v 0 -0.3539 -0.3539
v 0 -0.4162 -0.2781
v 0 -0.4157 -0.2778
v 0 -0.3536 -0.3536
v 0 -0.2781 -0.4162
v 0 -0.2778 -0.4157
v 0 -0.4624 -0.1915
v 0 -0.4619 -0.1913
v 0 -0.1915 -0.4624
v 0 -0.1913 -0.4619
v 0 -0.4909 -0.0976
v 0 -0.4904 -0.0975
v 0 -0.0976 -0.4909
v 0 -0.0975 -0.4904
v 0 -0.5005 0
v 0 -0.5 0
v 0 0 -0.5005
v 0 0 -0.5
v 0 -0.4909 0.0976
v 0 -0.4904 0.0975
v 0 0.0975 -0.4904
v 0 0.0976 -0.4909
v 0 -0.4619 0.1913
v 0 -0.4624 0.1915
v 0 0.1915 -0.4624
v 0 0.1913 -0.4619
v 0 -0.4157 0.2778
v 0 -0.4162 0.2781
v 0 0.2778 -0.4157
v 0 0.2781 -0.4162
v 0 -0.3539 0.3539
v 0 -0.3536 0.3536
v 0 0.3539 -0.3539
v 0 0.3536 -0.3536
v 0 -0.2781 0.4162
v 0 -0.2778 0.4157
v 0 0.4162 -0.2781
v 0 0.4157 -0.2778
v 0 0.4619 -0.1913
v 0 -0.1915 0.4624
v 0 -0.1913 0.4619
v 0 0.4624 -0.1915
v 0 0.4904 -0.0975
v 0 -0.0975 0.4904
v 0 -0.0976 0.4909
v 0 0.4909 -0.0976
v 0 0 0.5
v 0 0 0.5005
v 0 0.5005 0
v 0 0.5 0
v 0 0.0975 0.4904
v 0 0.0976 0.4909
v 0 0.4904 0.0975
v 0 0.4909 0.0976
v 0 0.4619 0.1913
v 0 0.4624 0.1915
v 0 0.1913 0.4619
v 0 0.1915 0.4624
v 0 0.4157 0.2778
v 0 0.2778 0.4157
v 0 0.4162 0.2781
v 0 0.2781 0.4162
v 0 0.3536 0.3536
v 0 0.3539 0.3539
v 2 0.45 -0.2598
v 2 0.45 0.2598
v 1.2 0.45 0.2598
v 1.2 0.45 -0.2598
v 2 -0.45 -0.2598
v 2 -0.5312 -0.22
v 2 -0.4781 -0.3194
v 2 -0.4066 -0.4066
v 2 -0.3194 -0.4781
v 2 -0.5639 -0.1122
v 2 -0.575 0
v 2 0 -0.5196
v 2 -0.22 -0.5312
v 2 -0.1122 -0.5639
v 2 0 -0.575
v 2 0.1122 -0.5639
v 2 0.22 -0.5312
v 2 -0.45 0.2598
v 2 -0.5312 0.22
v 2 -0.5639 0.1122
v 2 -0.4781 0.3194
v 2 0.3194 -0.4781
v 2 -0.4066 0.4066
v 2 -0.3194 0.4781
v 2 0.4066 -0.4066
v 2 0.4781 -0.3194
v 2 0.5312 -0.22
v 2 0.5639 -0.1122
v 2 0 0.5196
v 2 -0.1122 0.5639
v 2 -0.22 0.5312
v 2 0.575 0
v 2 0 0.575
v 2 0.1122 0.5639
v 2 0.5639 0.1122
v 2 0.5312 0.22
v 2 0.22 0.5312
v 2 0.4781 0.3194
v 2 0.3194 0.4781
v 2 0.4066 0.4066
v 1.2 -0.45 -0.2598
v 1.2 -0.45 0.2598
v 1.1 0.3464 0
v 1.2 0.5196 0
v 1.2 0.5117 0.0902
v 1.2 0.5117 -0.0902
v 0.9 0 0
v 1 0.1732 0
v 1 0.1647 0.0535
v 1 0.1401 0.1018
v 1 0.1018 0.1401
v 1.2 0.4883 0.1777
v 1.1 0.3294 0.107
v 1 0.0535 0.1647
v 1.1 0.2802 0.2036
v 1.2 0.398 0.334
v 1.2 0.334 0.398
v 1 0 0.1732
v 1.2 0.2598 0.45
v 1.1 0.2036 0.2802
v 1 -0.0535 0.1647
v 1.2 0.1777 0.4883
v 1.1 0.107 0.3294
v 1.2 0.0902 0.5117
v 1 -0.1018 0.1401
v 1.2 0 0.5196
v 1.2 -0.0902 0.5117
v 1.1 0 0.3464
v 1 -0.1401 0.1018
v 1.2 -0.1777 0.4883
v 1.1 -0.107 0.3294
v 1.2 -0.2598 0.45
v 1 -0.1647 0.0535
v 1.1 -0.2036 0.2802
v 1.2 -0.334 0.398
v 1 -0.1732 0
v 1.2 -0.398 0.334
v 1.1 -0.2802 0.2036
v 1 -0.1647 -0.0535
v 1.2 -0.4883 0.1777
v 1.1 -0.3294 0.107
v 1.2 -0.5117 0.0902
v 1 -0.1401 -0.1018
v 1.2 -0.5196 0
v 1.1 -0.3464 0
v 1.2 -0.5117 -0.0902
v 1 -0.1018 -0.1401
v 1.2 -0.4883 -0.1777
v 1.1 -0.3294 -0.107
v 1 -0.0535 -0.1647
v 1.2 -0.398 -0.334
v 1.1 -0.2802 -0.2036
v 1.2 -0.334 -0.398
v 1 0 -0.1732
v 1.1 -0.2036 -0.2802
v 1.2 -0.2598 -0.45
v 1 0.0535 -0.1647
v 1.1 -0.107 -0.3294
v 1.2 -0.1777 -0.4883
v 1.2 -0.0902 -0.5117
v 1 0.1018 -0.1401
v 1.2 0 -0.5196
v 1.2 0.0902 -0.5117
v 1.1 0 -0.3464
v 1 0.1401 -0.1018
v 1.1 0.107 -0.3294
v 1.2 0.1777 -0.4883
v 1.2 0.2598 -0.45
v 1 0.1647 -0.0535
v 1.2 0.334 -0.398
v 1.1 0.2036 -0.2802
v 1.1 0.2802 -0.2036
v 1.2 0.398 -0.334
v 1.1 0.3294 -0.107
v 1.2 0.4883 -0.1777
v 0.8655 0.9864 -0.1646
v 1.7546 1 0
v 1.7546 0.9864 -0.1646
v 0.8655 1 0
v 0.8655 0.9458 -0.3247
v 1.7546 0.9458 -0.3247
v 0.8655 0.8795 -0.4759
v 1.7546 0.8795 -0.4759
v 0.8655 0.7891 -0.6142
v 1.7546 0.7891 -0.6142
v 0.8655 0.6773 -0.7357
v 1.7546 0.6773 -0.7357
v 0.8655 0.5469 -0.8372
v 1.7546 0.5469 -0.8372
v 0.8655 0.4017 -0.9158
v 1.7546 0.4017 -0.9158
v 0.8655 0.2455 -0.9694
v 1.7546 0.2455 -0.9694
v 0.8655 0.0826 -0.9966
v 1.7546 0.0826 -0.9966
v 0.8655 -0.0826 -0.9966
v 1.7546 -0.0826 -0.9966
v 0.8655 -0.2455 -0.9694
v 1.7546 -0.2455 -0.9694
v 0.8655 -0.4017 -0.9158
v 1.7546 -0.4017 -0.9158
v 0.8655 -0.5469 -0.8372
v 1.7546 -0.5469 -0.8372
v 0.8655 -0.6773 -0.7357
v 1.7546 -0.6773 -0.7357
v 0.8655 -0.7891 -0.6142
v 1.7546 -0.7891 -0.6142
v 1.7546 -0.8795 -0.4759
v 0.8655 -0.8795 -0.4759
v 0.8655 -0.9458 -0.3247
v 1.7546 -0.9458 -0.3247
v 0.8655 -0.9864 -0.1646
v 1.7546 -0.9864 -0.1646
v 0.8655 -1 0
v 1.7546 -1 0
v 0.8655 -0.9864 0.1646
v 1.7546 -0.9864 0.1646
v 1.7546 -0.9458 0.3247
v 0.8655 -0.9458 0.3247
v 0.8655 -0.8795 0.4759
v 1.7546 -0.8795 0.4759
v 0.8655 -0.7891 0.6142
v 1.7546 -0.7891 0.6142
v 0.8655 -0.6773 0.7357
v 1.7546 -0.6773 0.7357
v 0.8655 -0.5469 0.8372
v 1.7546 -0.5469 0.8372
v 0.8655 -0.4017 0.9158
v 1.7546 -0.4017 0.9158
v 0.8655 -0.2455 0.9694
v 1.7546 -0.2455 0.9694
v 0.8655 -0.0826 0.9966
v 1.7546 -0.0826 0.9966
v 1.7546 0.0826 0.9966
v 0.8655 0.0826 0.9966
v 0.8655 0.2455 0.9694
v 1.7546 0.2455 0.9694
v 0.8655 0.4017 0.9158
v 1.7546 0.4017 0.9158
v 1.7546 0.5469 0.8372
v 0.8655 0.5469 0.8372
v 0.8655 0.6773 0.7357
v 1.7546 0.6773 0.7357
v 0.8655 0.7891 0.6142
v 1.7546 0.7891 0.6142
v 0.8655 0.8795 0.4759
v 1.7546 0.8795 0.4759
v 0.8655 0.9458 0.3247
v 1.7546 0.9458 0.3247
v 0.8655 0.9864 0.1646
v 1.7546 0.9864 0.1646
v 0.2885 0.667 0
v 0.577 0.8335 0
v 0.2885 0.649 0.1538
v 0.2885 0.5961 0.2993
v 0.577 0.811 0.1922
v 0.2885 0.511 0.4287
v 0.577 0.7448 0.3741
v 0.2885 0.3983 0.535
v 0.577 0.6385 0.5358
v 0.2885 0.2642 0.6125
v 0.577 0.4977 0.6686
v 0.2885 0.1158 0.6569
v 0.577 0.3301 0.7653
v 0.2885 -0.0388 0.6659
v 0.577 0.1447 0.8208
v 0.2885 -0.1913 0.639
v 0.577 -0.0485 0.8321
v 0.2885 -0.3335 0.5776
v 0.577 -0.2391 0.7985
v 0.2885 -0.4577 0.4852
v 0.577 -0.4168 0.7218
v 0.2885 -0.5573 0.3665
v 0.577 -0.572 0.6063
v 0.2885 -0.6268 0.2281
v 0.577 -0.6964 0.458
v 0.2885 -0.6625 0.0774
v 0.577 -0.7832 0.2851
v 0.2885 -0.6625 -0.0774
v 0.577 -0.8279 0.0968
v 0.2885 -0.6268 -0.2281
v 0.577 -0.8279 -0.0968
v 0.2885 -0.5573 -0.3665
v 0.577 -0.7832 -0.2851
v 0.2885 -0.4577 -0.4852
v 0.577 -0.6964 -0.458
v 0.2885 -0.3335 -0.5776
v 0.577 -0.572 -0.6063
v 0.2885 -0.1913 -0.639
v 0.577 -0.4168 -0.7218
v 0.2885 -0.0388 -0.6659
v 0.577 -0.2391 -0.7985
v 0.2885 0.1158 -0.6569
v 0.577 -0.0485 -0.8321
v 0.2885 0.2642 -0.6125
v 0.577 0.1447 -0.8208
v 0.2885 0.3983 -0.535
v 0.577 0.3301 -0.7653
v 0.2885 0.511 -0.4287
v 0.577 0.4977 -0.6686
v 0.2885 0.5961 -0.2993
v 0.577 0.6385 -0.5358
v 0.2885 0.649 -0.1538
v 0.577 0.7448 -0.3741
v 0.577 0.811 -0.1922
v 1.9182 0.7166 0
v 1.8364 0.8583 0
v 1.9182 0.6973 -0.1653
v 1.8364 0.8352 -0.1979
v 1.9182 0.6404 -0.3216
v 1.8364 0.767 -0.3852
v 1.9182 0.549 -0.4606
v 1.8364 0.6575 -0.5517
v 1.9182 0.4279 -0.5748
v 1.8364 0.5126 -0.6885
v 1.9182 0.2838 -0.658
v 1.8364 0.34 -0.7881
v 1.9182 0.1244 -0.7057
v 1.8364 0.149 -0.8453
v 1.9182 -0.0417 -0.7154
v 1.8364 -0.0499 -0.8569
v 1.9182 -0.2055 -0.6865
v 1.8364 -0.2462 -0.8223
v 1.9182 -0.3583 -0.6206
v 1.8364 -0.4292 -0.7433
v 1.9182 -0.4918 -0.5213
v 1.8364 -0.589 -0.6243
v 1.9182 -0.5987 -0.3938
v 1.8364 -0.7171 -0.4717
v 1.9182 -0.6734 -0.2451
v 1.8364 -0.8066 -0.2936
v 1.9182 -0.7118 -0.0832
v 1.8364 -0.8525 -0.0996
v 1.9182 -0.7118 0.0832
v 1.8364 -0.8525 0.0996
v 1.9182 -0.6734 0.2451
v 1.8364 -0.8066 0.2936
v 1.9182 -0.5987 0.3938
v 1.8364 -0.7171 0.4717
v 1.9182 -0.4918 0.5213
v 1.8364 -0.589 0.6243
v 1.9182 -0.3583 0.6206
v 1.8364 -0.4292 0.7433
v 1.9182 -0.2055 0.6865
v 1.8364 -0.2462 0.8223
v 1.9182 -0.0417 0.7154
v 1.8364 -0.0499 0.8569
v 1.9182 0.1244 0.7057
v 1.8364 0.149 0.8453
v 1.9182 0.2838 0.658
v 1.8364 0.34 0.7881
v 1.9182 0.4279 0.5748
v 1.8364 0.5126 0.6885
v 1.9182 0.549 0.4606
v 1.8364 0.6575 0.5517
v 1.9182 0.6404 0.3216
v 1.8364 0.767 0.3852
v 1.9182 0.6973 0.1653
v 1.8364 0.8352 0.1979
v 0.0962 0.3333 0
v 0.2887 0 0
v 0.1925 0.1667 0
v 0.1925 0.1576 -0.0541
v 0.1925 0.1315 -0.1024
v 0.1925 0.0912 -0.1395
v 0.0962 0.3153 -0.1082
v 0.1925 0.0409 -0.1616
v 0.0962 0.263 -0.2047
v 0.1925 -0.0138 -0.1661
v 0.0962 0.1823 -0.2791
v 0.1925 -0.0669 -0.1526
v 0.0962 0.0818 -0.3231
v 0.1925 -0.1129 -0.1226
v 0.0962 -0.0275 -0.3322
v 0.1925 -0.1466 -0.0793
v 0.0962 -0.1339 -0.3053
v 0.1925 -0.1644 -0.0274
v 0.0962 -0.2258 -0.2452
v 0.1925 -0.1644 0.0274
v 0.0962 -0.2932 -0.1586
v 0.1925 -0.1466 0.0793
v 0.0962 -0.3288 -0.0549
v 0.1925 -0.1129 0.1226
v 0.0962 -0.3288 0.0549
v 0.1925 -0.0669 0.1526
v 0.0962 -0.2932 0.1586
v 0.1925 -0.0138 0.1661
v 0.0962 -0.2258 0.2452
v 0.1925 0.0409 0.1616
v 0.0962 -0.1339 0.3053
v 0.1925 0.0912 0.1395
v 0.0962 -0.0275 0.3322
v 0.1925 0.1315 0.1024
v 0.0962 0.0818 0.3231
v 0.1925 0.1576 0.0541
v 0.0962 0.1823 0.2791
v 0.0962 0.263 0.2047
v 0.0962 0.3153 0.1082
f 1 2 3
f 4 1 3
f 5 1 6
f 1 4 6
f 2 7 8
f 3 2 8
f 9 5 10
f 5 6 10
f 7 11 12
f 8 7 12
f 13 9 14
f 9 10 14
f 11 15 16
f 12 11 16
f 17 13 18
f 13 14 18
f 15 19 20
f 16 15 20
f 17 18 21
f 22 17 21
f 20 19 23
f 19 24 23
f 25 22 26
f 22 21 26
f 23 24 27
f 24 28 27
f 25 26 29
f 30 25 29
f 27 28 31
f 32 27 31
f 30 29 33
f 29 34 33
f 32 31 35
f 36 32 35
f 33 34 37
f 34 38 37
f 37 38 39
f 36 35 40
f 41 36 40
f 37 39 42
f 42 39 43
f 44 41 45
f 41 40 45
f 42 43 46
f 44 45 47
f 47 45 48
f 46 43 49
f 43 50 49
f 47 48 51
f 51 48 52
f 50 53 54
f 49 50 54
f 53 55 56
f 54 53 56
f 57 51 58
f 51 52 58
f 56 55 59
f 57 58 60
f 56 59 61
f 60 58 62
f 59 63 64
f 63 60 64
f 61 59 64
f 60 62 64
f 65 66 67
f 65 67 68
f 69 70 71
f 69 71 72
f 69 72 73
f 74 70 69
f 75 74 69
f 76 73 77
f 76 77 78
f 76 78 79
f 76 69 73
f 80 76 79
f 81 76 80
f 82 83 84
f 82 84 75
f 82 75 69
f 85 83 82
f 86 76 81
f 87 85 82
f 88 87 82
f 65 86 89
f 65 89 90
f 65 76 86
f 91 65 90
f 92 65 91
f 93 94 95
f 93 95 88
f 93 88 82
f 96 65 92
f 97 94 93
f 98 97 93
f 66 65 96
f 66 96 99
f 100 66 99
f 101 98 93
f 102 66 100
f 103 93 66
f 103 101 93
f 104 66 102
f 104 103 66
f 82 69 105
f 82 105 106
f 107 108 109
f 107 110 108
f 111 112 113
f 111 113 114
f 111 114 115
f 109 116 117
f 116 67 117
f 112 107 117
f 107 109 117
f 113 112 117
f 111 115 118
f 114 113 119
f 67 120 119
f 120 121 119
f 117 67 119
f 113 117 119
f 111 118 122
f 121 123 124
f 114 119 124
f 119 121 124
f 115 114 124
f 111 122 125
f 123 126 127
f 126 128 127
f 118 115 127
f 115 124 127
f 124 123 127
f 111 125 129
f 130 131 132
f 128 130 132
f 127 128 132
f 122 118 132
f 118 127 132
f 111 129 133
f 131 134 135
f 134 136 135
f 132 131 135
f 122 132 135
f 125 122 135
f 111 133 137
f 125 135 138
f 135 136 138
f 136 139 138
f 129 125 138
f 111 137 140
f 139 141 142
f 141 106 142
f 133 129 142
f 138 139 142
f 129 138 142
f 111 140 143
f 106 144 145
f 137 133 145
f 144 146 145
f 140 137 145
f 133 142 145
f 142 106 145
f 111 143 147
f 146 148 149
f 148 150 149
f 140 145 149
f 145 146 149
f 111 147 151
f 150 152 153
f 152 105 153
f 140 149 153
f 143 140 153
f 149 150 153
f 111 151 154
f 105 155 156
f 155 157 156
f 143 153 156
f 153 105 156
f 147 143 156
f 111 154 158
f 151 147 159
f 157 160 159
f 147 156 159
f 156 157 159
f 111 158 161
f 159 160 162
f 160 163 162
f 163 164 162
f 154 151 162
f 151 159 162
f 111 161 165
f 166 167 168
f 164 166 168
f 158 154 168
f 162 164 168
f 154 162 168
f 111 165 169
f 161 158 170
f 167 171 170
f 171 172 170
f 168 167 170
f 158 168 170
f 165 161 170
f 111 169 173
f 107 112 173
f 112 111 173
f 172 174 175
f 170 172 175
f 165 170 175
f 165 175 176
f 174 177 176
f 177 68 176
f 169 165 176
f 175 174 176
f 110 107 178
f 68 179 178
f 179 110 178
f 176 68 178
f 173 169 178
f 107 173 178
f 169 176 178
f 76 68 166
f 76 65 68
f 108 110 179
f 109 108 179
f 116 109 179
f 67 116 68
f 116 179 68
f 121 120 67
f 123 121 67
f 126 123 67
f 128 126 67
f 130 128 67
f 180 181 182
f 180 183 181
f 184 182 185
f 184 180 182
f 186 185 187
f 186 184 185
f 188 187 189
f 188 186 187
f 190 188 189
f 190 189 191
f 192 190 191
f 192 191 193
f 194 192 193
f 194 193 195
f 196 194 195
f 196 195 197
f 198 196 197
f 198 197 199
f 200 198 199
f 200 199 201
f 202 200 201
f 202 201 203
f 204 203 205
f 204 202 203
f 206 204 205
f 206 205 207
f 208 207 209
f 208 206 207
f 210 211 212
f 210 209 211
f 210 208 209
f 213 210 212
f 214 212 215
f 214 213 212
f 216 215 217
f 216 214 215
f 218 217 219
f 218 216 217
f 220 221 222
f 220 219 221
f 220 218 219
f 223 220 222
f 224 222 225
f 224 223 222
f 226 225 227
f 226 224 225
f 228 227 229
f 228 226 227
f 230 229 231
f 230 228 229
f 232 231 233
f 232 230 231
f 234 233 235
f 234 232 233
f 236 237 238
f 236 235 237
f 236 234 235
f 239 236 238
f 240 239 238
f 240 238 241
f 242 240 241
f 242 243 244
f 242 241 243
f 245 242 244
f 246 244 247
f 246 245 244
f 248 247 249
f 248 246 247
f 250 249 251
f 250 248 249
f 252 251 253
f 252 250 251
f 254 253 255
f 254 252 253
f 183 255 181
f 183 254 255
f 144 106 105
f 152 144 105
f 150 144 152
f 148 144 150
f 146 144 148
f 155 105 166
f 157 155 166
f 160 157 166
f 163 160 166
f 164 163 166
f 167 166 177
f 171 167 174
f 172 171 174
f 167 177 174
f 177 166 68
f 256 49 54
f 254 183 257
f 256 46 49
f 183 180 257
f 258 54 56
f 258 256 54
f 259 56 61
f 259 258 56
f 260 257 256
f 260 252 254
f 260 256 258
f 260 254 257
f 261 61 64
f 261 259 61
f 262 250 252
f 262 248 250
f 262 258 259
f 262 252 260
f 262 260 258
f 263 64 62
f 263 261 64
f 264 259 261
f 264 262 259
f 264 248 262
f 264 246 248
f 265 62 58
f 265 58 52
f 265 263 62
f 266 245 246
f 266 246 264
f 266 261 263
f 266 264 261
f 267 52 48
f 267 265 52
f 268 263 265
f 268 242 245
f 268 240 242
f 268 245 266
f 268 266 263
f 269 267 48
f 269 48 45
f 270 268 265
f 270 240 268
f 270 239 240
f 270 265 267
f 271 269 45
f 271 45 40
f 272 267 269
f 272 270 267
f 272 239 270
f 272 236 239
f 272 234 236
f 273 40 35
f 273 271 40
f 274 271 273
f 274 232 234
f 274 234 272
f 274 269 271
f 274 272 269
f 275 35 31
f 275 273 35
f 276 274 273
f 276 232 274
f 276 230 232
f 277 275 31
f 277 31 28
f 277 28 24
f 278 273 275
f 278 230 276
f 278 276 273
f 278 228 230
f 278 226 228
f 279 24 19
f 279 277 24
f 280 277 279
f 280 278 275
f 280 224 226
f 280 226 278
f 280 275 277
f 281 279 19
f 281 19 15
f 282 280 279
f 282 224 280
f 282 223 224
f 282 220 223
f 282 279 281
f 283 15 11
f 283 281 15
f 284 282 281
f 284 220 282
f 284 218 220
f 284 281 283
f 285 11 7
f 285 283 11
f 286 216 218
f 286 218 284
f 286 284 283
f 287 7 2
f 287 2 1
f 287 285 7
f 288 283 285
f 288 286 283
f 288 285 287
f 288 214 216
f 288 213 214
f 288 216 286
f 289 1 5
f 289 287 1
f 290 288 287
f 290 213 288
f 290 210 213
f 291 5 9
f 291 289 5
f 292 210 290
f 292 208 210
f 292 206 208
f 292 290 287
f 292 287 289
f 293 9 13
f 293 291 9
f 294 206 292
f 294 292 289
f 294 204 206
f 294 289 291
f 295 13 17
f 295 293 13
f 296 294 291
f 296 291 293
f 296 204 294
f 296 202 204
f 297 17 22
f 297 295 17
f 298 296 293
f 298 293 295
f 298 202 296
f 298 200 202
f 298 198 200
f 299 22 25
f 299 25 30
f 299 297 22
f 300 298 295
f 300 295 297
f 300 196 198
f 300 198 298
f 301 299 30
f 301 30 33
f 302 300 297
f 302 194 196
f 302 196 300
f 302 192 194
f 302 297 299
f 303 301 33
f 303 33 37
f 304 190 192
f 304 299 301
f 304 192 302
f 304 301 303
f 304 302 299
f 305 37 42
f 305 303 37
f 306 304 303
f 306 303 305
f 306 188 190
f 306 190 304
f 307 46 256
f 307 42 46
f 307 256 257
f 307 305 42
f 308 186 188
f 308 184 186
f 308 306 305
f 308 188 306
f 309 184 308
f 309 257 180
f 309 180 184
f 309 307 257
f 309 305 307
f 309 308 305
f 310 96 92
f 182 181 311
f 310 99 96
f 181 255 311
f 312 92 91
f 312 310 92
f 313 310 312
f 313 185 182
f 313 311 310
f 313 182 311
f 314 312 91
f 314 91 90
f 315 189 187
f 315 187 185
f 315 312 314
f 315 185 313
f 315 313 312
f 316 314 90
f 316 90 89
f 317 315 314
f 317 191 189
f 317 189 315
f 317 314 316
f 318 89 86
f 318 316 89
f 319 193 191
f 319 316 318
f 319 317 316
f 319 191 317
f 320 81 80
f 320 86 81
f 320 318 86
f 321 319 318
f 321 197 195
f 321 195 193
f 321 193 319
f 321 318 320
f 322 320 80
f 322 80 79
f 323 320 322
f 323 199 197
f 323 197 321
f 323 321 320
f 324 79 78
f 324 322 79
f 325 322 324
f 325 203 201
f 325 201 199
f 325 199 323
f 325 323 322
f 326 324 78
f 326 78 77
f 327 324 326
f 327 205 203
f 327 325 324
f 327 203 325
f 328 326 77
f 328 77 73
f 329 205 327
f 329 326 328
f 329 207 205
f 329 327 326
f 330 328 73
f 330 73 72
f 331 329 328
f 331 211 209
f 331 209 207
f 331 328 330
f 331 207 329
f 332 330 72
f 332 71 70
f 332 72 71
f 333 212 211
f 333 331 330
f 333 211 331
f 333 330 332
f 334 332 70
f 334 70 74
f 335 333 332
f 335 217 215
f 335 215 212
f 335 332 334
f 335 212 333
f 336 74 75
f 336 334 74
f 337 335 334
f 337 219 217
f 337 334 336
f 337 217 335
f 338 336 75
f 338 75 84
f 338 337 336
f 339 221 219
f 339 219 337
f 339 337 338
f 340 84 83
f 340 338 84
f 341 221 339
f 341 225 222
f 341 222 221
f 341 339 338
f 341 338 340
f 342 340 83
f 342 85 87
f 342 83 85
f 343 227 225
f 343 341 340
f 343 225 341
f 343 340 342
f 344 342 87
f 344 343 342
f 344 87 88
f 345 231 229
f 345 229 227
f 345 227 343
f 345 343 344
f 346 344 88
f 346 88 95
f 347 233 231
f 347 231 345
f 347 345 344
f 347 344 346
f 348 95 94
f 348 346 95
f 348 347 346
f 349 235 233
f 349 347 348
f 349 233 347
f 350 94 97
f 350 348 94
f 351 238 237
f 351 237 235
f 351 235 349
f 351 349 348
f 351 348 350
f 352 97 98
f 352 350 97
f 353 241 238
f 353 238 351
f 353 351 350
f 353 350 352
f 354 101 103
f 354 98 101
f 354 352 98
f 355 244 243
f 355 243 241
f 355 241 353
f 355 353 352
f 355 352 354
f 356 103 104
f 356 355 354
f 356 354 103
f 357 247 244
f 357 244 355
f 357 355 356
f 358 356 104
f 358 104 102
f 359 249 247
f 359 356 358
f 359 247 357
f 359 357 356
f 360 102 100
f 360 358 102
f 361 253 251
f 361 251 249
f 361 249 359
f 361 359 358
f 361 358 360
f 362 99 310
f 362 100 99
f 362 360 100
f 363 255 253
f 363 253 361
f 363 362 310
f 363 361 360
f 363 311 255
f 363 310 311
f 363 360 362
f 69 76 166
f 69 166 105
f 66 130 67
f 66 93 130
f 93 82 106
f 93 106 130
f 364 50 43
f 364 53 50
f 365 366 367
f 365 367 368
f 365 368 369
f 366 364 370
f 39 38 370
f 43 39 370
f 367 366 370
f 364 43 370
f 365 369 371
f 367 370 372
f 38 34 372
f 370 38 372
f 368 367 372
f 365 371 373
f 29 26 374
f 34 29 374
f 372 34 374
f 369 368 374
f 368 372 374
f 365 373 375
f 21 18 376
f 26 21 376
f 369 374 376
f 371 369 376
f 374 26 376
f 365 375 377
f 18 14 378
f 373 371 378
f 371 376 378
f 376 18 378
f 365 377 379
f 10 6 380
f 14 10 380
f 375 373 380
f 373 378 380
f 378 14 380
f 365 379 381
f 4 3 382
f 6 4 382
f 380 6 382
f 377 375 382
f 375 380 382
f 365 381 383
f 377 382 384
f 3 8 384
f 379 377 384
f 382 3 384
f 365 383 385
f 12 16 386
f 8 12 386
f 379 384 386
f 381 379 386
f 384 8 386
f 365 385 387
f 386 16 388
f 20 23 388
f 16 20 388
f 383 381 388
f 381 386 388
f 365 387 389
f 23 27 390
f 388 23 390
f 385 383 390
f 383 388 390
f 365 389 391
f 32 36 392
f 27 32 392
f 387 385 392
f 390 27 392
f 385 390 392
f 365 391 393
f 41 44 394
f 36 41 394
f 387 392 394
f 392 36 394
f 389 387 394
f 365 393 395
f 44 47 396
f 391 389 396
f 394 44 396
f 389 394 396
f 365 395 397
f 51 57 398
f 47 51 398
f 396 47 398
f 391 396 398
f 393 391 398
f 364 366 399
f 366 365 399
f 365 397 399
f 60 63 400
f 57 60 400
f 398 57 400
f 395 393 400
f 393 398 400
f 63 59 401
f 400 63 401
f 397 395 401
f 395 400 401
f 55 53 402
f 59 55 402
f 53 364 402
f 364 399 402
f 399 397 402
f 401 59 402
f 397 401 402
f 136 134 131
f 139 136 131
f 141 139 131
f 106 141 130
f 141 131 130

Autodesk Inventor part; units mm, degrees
ref_plane "YZ Plane" through (0, 0, 0) normal (1, 0, 0) x (0, 1, 0)
ref_plane "XZ Plane" through (0, 0, 0) normal (0, 1, 0) x (-1, 0, 0)
sketch "Sketch1" plane through (0, 0, 0) normal (0, 0, 1) x (1, 0, 0)
  line L0 (0.2887, 0) -> (0.9, 0)
  line L1 (2, 0.5196) -> (2, 1)
  line L2 (2, 1) -> (0, 1)
  line L3 (2, 0.5196) -> (1.2, 0.5196)
  line L4 (1.2, 0.5196) -> (0.9, 0)
  line L5 (0, 0.5) -> (0.2887, 0)
  line L6 (0, -0.2) -> (0, 1.2) projected
  line L7 (0, 0.5) -> (0, 1)
  point P0 (0, 0)
  dimension "d0" = 0.8
  dimension "d1" = 60
  dimension "d2" = 2
  dimension "d3" = 1.0392
  dimension "d4" = 2
  dimension "d5" = 60
  dimension "d7" = 1
revolve "Body" add sketch "Sketch1" angle 360 about axis through (0.2887, 0, 0) along (1, 0, 0)
sketch "Sketch2" plane through (2, 0, 0) normal (1, 0, 0) x (0, 0, -1)
  circle A0 centre (0, 0) radius 0.5196 projected
  circle A1 centre (0, 0) radius 1 projected
  line L0 (0.5196, 0) -> (0.2598, -0.45)
  line L1 (0.2598, -0.45) -> (-0.2598, -0.45)
  line L2 (-0.2598, -0.45) -> (-0.5196, 0)
  line L3 (-0.5196, 0) -> (-0.2598, 0.45)
  line L4 (-0.2598, 0.45) -> (0.2598, 0.45)
  line L5 (0.2598, 0.45) -> (0.5196, 0)
extrude "Slot" add sketch "Sketch2" against normal blind 0.8 contours L5 A0 | A0 L0 | L4 A0 | A0 L1 | L3 A0 | A0 L2
chamfer "Chamfer1" distance 0.5 angle 60 1 edges at (0, -1, 0) measured on face at (0, 0.8236, -0.0798)
thread "Thread" size "M2x0.4" class "6g" standard "ISO Metric profile" length 2
chamfer "Chamfer2" distance 0.2454 angle 60 1 edges at (2, -1, 0) measured on face at (1.244, 0.9871, -0.1604)
ref_plane "Work Plane1" through (1, 0, 0) normal (0, -0.5, -0.866) x (1, 0, 0)
equation "\"d0\" = INTI"
equation "\"d2\" = NND"
equation "\"d3\" = 1.1547 * SW"
equation "\"d4\" = NLG"
equation "\"d5\" = 0.5 * ANG"
equation "\"d7\" = SPD"
equation "\"d8\" = INTI"
equation "\"d10\" = -0.5 * SPD + 0.5 * NND"
equation "\"d11\" = FAWI"
equation "\"d33\" = -0.5 * SPD + 0.5 * NND"
equation "\"d14\" = NLG"
equation "\"d12\" = -0.5 * GD1 + 0.5 * NND"
equation "\"d13\" = FAWI"
equation "\"d34\" = -0.5 * GD1 + 0.5 * NND"
equation "\"NND\" = 2"
equation "\"NLG\" = 2"
equation "\"INTI\" = 0.8"
equation "\"FAWI\" = 60deg"
equation "\"SW\" = 0.9"
equation "\"GD1\" = THREADDIA - 1.2269 * PTC"
equation "\"ANG\" = 120deg"
equation "\"FAWI1\" = 45deg"
equation "\"SPD\" = 1"
equation "\"GUL\" = 0.61345 * PTC"
equation "\"TOA\" = 30deg"
equation "\"THREADDIA\" = 2"
equation "\"PTC\" = 0.4"
equation "\"GAL\" = 0.61345 * PTC"
equation "\"E0\" = 1.155 * SW"
properties part number "ISO 4029 - M2 x 2(1)" material "Stainless Steel, 440C"
